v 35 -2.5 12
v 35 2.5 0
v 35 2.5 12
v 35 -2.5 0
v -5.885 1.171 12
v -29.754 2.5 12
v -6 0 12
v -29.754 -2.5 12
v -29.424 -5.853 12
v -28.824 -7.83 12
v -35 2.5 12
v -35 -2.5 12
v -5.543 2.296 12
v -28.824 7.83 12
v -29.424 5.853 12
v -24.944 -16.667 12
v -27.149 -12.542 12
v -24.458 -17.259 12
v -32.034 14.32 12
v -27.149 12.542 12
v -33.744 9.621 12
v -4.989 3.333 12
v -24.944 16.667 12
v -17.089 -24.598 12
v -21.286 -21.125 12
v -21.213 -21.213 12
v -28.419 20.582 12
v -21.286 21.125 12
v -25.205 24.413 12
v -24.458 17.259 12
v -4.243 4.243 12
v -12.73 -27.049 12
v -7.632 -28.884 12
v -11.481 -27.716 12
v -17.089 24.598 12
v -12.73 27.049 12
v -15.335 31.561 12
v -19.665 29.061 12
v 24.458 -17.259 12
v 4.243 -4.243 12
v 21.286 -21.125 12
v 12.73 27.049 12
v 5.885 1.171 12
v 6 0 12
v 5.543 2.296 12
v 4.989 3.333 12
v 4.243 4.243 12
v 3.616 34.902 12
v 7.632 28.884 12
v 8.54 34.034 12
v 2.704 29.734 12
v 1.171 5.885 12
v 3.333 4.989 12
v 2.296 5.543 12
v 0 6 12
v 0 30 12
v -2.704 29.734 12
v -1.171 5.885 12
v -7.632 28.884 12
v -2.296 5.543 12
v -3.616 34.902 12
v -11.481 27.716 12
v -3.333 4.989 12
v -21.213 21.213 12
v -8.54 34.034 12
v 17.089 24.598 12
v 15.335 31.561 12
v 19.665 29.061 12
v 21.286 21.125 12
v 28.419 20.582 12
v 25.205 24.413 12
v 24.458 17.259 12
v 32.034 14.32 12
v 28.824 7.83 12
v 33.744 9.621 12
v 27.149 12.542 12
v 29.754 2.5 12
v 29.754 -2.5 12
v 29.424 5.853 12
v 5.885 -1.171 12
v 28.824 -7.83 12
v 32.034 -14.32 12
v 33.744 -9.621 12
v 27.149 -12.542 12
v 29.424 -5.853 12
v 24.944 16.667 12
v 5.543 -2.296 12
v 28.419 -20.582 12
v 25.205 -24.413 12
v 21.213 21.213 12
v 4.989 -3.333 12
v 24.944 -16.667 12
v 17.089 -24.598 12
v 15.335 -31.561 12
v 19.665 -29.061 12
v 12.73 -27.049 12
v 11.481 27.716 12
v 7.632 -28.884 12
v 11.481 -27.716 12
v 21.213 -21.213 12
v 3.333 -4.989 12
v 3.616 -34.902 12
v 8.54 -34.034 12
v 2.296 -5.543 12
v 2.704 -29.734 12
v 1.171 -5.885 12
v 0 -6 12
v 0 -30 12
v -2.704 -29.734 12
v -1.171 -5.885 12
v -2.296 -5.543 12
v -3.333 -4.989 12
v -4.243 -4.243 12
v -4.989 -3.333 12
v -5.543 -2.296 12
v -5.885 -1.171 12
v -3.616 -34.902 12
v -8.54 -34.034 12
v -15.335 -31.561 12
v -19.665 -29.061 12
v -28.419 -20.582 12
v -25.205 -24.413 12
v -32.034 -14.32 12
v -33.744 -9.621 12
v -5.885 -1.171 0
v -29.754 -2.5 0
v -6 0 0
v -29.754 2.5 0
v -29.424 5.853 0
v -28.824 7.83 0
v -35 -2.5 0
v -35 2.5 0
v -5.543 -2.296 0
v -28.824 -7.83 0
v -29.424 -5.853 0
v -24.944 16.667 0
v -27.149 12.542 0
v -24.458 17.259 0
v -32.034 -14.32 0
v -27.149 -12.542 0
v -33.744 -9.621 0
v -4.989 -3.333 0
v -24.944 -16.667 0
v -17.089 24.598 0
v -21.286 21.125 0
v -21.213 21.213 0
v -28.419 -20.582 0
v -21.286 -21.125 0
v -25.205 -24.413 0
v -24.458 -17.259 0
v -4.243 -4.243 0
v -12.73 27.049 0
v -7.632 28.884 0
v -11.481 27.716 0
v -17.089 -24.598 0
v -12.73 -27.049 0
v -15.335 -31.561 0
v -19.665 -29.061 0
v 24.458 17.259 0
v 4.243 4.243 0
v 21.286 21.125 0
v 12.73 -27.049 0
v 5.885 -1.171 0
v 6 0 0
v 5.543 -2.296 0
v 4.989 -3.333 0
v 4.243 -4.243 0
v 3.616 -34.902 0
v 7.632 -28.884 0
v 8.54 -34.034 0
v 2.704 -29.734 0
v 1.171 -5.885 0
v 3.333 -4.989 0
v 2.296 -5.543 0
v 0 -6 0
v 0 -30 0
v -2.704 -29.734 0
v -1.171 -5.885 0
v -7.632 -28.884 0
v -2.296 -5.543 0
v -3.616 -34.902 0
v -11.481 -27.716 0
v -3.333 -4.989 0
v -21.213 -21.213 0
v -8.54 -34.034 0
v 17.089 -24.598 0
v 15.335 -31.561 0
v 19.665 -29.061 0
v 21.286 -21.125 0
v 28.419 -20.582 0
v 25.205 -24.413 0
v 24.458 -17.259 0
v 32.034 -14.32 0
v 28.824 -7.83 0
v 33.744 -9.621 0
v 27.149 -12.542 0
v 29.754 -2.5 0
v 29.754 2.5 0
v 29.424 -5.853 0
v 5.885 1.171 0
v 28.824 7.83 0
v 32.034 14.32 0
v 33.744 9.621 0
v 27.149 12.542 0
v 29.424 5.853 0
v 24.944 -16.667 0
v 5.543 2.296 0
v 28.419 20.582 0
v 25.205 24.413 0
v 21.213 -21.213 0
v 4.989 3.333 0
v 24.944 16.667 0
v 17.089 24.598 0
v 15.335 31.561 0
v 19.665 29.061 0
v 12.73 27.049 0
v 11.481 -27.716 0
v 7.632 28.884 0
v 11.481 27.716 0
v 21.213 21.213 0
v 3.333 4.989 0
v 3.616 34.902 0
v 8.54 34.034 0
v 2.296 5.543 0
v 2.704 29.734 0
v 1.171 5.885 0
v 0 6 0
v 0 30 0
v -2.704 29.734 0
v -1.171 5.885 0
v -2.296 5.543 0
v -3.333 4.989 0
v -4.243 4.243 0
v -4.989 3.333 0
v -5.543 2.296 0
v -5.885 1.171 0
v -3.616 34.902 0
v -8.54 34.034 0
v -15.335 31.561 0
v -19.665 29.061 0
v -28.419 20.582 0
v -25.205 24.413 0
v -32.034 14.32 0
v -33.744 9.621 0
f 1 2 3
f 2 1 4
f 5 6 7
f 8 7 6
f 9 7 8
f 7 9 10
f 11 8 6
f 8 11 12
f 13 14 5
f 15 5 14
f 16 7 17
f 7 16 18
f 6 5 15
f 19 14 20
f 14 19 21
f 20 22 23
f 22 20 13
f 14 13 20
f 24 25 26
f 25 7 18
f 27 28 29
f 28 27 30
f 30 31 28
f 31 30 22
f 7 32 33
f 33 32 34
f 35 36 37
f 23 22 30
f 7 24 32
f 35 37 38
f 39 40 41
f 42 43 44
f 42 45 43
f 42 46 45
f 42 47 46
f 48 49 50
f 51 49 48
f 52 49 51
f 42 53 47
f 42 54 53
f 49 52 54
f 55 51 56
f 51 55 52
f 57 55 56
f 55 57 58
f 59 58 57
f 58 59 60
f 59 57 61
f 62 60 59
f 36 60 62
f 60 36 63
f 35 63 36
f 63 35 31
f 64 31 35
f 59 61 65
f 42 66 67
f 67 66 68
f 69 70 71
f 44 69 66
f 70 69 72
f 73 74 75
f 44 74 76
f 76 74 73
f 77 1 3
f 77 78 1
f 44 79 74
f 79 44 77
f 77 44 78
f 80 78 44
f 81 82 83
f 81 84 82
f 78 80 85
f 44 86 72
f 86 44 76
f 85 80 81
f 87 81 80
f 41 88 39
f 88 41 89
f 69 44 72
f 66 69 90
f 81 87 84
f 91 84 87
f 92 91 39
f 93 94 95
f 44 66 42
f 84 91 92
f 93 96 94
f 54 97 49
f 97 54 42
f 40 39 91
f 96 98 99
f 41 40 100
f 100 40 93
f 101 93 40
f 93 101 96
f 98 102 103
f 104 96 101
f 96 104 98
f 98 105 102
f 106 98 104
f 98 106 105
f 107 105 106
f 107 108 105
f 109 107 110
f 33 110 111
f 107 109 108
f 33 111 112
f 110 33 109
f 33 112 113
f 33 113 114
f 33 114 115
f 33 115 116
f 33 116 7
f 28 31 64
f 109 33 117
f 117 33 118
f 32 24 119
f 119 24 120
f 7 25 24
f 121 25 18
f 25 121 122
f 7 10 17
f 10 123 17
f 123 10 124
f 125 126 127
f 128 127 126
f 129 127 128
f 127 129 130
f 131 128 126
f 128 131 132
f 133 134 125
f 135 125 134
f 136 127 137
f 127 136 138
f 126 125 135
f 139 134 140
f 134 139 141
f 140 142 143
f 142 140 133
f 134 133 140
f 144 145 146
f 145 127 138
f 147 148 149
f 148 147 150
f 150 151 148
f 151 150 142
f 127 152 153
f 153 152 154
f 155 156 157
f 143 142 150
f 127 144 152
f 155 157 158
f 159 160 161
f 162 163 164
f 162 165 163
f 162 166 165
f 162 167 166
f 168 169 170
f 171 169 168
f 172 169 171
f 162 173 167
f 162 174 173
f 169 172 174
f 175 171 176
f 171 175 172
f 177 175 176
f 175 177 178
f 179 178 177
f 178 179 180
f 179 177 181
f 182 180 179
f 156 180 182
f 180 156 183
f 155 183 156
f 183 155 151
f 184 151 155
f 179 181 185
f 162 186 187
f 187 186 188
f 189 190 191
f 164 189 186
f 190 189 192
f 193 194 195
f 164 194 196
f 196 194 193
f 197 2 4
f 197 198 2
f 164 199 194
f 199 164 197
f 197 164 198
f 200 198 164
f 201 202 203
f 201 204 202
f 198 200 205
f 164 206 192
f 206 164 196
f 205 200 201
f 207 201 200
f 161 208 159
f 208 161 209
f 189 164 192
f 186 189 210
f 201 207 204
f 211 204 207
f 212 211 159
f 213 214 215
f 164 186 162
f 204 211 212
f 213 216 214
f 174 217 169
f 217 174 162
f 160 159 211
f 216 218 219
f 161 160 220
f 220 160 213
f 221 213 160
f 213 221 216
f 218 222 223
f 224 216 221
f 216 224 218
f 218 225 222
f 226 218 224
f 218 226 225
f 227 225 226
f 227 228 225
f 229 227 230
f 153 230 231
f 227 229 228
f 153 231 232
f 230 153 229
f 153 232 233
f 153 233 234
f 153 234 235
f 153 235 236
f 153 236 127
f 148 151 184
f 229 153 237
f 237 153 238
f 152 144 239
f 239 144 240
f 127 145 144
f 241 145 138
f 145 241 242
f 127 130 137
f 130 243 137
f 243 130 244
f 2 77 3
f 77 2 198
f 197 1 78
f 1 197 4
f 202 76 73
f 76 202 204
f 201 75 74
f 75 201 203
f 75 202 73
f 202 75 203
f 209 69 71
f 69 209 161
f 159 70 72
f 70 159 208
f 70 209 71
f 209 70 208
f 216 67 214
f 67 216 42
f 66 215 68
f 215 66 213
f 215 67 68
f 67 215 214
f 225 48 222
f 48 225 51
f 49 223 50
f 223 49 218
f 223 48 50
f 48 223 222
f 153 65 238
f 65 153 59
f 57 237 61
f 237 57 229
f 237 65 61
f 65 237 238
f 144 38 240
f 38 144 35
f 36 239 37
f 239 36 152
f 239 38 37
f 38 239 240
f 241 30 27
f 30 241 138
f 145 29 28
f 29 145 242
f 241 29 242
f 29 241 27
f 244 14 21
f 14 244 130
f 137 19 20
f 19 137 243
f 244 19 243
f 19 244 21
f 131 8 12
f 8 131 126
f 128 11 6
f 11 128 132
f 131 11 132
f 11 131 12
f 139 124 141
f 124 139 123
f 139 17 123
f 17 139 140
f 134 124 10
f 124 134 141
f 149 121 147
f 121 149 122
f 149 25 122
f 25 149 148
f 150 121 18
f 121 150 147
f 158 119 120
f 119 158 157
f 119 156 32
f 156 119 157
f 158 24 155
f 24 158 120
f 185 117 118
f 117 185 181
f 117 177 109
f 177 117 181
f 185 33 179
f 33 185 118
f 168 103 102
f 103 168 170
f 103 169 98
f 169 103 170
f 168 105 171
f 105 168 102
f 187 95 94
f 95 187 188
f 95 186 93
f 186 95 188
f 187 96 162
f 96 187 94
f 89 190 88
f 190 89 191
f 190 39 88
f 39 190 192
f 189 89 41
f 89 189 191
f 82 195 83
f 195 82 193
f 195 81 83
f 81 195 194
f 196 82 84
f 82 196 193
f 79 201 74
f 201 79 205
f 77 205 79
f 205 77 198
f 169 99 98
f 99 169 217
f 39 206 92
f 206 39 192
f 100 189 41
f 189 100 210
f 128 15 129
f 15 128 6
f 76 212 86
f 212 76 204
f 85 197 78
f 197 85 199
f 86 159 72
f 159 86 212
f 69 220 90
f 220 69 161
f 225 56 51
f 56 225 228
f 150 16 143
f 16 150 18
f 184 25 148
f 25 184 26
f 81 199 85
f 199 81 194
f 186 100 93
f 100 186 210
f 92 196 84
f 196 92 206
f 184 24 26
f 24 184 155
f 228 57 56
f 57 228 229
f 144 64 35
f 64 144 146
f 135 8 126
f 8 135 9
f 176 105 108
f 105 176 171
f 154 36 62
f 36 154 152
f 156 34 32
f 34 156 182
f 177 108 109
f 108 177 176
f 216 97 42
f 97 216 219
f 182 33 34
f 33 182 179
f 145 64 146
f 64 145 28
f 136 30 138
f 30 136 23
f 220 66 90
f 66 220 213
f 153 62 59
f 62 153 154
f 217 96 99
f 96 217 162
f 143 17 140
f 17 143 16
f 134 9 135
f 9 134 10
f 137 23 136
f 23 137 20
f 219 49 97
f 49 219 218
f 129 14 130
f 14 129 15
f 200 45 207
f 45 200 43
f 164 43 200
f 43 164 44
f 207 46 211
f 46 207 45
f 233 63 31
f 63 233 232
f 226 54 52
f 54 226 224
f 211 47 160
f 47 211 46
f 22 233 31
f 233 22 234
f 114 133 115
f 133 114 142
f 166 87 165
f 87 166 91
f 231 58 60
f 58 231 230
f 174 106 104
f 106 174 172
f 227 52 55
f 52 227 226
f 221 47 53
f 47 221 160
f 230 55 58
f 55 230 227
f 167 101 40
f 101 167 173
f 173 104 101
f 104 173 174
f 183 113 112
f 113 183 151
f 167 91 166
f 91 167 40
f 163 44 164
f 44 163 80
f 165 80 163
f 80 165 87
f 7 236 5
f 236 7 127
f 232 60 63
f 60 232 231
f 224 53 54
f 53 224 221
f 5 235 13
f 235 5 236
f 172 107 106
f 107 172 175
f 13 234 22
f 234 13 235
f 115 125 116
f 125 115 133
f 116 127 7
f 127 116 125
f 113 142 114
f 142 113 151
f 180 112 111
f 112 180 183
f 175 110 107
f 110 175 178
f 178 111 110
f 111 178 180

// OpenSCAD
$fn = 32;

// ----------------------------------------------------------------------
// Spur blank: bored gear blank
// ----------------------------------------------------------------------

// --- parameters (mm) ---
disc_r = 30;              // blank root radius
disc_t = 12;              // blank thickness
n_teeth = 18;             // stub tooth count
tooth_w = 5;              // tooth width at the root
tooth_h = 5;              // tooth height above the root
bore_r = 6;               // central bore radius
fit_tol = 0.05;           // tolerance for press fits, mm
free_tol = 0.2;           // tolerance for clearance fits, mm

out_r = disc_r + tooth_h;  // tip radius
bbox_x = 70.0;  // measured width over the teeth
bbox_y = 69.8;  // measured depth over the teeth

difference() {
union() {
  cylinder(r = disc_r, h = disc_t);
  for (i = [0 : n_teeth - 1])
    rotate([0, 0, i * 360 / n_teeth])
      translate([disc_r - 1, -tooth_w / 2, 0])
        cube([tooth_h + 1, tooth_w, disc_t]);
}
  translate([0, 0, -1]) cylinder(r = bore_r, h = disc_t + 2);
}
